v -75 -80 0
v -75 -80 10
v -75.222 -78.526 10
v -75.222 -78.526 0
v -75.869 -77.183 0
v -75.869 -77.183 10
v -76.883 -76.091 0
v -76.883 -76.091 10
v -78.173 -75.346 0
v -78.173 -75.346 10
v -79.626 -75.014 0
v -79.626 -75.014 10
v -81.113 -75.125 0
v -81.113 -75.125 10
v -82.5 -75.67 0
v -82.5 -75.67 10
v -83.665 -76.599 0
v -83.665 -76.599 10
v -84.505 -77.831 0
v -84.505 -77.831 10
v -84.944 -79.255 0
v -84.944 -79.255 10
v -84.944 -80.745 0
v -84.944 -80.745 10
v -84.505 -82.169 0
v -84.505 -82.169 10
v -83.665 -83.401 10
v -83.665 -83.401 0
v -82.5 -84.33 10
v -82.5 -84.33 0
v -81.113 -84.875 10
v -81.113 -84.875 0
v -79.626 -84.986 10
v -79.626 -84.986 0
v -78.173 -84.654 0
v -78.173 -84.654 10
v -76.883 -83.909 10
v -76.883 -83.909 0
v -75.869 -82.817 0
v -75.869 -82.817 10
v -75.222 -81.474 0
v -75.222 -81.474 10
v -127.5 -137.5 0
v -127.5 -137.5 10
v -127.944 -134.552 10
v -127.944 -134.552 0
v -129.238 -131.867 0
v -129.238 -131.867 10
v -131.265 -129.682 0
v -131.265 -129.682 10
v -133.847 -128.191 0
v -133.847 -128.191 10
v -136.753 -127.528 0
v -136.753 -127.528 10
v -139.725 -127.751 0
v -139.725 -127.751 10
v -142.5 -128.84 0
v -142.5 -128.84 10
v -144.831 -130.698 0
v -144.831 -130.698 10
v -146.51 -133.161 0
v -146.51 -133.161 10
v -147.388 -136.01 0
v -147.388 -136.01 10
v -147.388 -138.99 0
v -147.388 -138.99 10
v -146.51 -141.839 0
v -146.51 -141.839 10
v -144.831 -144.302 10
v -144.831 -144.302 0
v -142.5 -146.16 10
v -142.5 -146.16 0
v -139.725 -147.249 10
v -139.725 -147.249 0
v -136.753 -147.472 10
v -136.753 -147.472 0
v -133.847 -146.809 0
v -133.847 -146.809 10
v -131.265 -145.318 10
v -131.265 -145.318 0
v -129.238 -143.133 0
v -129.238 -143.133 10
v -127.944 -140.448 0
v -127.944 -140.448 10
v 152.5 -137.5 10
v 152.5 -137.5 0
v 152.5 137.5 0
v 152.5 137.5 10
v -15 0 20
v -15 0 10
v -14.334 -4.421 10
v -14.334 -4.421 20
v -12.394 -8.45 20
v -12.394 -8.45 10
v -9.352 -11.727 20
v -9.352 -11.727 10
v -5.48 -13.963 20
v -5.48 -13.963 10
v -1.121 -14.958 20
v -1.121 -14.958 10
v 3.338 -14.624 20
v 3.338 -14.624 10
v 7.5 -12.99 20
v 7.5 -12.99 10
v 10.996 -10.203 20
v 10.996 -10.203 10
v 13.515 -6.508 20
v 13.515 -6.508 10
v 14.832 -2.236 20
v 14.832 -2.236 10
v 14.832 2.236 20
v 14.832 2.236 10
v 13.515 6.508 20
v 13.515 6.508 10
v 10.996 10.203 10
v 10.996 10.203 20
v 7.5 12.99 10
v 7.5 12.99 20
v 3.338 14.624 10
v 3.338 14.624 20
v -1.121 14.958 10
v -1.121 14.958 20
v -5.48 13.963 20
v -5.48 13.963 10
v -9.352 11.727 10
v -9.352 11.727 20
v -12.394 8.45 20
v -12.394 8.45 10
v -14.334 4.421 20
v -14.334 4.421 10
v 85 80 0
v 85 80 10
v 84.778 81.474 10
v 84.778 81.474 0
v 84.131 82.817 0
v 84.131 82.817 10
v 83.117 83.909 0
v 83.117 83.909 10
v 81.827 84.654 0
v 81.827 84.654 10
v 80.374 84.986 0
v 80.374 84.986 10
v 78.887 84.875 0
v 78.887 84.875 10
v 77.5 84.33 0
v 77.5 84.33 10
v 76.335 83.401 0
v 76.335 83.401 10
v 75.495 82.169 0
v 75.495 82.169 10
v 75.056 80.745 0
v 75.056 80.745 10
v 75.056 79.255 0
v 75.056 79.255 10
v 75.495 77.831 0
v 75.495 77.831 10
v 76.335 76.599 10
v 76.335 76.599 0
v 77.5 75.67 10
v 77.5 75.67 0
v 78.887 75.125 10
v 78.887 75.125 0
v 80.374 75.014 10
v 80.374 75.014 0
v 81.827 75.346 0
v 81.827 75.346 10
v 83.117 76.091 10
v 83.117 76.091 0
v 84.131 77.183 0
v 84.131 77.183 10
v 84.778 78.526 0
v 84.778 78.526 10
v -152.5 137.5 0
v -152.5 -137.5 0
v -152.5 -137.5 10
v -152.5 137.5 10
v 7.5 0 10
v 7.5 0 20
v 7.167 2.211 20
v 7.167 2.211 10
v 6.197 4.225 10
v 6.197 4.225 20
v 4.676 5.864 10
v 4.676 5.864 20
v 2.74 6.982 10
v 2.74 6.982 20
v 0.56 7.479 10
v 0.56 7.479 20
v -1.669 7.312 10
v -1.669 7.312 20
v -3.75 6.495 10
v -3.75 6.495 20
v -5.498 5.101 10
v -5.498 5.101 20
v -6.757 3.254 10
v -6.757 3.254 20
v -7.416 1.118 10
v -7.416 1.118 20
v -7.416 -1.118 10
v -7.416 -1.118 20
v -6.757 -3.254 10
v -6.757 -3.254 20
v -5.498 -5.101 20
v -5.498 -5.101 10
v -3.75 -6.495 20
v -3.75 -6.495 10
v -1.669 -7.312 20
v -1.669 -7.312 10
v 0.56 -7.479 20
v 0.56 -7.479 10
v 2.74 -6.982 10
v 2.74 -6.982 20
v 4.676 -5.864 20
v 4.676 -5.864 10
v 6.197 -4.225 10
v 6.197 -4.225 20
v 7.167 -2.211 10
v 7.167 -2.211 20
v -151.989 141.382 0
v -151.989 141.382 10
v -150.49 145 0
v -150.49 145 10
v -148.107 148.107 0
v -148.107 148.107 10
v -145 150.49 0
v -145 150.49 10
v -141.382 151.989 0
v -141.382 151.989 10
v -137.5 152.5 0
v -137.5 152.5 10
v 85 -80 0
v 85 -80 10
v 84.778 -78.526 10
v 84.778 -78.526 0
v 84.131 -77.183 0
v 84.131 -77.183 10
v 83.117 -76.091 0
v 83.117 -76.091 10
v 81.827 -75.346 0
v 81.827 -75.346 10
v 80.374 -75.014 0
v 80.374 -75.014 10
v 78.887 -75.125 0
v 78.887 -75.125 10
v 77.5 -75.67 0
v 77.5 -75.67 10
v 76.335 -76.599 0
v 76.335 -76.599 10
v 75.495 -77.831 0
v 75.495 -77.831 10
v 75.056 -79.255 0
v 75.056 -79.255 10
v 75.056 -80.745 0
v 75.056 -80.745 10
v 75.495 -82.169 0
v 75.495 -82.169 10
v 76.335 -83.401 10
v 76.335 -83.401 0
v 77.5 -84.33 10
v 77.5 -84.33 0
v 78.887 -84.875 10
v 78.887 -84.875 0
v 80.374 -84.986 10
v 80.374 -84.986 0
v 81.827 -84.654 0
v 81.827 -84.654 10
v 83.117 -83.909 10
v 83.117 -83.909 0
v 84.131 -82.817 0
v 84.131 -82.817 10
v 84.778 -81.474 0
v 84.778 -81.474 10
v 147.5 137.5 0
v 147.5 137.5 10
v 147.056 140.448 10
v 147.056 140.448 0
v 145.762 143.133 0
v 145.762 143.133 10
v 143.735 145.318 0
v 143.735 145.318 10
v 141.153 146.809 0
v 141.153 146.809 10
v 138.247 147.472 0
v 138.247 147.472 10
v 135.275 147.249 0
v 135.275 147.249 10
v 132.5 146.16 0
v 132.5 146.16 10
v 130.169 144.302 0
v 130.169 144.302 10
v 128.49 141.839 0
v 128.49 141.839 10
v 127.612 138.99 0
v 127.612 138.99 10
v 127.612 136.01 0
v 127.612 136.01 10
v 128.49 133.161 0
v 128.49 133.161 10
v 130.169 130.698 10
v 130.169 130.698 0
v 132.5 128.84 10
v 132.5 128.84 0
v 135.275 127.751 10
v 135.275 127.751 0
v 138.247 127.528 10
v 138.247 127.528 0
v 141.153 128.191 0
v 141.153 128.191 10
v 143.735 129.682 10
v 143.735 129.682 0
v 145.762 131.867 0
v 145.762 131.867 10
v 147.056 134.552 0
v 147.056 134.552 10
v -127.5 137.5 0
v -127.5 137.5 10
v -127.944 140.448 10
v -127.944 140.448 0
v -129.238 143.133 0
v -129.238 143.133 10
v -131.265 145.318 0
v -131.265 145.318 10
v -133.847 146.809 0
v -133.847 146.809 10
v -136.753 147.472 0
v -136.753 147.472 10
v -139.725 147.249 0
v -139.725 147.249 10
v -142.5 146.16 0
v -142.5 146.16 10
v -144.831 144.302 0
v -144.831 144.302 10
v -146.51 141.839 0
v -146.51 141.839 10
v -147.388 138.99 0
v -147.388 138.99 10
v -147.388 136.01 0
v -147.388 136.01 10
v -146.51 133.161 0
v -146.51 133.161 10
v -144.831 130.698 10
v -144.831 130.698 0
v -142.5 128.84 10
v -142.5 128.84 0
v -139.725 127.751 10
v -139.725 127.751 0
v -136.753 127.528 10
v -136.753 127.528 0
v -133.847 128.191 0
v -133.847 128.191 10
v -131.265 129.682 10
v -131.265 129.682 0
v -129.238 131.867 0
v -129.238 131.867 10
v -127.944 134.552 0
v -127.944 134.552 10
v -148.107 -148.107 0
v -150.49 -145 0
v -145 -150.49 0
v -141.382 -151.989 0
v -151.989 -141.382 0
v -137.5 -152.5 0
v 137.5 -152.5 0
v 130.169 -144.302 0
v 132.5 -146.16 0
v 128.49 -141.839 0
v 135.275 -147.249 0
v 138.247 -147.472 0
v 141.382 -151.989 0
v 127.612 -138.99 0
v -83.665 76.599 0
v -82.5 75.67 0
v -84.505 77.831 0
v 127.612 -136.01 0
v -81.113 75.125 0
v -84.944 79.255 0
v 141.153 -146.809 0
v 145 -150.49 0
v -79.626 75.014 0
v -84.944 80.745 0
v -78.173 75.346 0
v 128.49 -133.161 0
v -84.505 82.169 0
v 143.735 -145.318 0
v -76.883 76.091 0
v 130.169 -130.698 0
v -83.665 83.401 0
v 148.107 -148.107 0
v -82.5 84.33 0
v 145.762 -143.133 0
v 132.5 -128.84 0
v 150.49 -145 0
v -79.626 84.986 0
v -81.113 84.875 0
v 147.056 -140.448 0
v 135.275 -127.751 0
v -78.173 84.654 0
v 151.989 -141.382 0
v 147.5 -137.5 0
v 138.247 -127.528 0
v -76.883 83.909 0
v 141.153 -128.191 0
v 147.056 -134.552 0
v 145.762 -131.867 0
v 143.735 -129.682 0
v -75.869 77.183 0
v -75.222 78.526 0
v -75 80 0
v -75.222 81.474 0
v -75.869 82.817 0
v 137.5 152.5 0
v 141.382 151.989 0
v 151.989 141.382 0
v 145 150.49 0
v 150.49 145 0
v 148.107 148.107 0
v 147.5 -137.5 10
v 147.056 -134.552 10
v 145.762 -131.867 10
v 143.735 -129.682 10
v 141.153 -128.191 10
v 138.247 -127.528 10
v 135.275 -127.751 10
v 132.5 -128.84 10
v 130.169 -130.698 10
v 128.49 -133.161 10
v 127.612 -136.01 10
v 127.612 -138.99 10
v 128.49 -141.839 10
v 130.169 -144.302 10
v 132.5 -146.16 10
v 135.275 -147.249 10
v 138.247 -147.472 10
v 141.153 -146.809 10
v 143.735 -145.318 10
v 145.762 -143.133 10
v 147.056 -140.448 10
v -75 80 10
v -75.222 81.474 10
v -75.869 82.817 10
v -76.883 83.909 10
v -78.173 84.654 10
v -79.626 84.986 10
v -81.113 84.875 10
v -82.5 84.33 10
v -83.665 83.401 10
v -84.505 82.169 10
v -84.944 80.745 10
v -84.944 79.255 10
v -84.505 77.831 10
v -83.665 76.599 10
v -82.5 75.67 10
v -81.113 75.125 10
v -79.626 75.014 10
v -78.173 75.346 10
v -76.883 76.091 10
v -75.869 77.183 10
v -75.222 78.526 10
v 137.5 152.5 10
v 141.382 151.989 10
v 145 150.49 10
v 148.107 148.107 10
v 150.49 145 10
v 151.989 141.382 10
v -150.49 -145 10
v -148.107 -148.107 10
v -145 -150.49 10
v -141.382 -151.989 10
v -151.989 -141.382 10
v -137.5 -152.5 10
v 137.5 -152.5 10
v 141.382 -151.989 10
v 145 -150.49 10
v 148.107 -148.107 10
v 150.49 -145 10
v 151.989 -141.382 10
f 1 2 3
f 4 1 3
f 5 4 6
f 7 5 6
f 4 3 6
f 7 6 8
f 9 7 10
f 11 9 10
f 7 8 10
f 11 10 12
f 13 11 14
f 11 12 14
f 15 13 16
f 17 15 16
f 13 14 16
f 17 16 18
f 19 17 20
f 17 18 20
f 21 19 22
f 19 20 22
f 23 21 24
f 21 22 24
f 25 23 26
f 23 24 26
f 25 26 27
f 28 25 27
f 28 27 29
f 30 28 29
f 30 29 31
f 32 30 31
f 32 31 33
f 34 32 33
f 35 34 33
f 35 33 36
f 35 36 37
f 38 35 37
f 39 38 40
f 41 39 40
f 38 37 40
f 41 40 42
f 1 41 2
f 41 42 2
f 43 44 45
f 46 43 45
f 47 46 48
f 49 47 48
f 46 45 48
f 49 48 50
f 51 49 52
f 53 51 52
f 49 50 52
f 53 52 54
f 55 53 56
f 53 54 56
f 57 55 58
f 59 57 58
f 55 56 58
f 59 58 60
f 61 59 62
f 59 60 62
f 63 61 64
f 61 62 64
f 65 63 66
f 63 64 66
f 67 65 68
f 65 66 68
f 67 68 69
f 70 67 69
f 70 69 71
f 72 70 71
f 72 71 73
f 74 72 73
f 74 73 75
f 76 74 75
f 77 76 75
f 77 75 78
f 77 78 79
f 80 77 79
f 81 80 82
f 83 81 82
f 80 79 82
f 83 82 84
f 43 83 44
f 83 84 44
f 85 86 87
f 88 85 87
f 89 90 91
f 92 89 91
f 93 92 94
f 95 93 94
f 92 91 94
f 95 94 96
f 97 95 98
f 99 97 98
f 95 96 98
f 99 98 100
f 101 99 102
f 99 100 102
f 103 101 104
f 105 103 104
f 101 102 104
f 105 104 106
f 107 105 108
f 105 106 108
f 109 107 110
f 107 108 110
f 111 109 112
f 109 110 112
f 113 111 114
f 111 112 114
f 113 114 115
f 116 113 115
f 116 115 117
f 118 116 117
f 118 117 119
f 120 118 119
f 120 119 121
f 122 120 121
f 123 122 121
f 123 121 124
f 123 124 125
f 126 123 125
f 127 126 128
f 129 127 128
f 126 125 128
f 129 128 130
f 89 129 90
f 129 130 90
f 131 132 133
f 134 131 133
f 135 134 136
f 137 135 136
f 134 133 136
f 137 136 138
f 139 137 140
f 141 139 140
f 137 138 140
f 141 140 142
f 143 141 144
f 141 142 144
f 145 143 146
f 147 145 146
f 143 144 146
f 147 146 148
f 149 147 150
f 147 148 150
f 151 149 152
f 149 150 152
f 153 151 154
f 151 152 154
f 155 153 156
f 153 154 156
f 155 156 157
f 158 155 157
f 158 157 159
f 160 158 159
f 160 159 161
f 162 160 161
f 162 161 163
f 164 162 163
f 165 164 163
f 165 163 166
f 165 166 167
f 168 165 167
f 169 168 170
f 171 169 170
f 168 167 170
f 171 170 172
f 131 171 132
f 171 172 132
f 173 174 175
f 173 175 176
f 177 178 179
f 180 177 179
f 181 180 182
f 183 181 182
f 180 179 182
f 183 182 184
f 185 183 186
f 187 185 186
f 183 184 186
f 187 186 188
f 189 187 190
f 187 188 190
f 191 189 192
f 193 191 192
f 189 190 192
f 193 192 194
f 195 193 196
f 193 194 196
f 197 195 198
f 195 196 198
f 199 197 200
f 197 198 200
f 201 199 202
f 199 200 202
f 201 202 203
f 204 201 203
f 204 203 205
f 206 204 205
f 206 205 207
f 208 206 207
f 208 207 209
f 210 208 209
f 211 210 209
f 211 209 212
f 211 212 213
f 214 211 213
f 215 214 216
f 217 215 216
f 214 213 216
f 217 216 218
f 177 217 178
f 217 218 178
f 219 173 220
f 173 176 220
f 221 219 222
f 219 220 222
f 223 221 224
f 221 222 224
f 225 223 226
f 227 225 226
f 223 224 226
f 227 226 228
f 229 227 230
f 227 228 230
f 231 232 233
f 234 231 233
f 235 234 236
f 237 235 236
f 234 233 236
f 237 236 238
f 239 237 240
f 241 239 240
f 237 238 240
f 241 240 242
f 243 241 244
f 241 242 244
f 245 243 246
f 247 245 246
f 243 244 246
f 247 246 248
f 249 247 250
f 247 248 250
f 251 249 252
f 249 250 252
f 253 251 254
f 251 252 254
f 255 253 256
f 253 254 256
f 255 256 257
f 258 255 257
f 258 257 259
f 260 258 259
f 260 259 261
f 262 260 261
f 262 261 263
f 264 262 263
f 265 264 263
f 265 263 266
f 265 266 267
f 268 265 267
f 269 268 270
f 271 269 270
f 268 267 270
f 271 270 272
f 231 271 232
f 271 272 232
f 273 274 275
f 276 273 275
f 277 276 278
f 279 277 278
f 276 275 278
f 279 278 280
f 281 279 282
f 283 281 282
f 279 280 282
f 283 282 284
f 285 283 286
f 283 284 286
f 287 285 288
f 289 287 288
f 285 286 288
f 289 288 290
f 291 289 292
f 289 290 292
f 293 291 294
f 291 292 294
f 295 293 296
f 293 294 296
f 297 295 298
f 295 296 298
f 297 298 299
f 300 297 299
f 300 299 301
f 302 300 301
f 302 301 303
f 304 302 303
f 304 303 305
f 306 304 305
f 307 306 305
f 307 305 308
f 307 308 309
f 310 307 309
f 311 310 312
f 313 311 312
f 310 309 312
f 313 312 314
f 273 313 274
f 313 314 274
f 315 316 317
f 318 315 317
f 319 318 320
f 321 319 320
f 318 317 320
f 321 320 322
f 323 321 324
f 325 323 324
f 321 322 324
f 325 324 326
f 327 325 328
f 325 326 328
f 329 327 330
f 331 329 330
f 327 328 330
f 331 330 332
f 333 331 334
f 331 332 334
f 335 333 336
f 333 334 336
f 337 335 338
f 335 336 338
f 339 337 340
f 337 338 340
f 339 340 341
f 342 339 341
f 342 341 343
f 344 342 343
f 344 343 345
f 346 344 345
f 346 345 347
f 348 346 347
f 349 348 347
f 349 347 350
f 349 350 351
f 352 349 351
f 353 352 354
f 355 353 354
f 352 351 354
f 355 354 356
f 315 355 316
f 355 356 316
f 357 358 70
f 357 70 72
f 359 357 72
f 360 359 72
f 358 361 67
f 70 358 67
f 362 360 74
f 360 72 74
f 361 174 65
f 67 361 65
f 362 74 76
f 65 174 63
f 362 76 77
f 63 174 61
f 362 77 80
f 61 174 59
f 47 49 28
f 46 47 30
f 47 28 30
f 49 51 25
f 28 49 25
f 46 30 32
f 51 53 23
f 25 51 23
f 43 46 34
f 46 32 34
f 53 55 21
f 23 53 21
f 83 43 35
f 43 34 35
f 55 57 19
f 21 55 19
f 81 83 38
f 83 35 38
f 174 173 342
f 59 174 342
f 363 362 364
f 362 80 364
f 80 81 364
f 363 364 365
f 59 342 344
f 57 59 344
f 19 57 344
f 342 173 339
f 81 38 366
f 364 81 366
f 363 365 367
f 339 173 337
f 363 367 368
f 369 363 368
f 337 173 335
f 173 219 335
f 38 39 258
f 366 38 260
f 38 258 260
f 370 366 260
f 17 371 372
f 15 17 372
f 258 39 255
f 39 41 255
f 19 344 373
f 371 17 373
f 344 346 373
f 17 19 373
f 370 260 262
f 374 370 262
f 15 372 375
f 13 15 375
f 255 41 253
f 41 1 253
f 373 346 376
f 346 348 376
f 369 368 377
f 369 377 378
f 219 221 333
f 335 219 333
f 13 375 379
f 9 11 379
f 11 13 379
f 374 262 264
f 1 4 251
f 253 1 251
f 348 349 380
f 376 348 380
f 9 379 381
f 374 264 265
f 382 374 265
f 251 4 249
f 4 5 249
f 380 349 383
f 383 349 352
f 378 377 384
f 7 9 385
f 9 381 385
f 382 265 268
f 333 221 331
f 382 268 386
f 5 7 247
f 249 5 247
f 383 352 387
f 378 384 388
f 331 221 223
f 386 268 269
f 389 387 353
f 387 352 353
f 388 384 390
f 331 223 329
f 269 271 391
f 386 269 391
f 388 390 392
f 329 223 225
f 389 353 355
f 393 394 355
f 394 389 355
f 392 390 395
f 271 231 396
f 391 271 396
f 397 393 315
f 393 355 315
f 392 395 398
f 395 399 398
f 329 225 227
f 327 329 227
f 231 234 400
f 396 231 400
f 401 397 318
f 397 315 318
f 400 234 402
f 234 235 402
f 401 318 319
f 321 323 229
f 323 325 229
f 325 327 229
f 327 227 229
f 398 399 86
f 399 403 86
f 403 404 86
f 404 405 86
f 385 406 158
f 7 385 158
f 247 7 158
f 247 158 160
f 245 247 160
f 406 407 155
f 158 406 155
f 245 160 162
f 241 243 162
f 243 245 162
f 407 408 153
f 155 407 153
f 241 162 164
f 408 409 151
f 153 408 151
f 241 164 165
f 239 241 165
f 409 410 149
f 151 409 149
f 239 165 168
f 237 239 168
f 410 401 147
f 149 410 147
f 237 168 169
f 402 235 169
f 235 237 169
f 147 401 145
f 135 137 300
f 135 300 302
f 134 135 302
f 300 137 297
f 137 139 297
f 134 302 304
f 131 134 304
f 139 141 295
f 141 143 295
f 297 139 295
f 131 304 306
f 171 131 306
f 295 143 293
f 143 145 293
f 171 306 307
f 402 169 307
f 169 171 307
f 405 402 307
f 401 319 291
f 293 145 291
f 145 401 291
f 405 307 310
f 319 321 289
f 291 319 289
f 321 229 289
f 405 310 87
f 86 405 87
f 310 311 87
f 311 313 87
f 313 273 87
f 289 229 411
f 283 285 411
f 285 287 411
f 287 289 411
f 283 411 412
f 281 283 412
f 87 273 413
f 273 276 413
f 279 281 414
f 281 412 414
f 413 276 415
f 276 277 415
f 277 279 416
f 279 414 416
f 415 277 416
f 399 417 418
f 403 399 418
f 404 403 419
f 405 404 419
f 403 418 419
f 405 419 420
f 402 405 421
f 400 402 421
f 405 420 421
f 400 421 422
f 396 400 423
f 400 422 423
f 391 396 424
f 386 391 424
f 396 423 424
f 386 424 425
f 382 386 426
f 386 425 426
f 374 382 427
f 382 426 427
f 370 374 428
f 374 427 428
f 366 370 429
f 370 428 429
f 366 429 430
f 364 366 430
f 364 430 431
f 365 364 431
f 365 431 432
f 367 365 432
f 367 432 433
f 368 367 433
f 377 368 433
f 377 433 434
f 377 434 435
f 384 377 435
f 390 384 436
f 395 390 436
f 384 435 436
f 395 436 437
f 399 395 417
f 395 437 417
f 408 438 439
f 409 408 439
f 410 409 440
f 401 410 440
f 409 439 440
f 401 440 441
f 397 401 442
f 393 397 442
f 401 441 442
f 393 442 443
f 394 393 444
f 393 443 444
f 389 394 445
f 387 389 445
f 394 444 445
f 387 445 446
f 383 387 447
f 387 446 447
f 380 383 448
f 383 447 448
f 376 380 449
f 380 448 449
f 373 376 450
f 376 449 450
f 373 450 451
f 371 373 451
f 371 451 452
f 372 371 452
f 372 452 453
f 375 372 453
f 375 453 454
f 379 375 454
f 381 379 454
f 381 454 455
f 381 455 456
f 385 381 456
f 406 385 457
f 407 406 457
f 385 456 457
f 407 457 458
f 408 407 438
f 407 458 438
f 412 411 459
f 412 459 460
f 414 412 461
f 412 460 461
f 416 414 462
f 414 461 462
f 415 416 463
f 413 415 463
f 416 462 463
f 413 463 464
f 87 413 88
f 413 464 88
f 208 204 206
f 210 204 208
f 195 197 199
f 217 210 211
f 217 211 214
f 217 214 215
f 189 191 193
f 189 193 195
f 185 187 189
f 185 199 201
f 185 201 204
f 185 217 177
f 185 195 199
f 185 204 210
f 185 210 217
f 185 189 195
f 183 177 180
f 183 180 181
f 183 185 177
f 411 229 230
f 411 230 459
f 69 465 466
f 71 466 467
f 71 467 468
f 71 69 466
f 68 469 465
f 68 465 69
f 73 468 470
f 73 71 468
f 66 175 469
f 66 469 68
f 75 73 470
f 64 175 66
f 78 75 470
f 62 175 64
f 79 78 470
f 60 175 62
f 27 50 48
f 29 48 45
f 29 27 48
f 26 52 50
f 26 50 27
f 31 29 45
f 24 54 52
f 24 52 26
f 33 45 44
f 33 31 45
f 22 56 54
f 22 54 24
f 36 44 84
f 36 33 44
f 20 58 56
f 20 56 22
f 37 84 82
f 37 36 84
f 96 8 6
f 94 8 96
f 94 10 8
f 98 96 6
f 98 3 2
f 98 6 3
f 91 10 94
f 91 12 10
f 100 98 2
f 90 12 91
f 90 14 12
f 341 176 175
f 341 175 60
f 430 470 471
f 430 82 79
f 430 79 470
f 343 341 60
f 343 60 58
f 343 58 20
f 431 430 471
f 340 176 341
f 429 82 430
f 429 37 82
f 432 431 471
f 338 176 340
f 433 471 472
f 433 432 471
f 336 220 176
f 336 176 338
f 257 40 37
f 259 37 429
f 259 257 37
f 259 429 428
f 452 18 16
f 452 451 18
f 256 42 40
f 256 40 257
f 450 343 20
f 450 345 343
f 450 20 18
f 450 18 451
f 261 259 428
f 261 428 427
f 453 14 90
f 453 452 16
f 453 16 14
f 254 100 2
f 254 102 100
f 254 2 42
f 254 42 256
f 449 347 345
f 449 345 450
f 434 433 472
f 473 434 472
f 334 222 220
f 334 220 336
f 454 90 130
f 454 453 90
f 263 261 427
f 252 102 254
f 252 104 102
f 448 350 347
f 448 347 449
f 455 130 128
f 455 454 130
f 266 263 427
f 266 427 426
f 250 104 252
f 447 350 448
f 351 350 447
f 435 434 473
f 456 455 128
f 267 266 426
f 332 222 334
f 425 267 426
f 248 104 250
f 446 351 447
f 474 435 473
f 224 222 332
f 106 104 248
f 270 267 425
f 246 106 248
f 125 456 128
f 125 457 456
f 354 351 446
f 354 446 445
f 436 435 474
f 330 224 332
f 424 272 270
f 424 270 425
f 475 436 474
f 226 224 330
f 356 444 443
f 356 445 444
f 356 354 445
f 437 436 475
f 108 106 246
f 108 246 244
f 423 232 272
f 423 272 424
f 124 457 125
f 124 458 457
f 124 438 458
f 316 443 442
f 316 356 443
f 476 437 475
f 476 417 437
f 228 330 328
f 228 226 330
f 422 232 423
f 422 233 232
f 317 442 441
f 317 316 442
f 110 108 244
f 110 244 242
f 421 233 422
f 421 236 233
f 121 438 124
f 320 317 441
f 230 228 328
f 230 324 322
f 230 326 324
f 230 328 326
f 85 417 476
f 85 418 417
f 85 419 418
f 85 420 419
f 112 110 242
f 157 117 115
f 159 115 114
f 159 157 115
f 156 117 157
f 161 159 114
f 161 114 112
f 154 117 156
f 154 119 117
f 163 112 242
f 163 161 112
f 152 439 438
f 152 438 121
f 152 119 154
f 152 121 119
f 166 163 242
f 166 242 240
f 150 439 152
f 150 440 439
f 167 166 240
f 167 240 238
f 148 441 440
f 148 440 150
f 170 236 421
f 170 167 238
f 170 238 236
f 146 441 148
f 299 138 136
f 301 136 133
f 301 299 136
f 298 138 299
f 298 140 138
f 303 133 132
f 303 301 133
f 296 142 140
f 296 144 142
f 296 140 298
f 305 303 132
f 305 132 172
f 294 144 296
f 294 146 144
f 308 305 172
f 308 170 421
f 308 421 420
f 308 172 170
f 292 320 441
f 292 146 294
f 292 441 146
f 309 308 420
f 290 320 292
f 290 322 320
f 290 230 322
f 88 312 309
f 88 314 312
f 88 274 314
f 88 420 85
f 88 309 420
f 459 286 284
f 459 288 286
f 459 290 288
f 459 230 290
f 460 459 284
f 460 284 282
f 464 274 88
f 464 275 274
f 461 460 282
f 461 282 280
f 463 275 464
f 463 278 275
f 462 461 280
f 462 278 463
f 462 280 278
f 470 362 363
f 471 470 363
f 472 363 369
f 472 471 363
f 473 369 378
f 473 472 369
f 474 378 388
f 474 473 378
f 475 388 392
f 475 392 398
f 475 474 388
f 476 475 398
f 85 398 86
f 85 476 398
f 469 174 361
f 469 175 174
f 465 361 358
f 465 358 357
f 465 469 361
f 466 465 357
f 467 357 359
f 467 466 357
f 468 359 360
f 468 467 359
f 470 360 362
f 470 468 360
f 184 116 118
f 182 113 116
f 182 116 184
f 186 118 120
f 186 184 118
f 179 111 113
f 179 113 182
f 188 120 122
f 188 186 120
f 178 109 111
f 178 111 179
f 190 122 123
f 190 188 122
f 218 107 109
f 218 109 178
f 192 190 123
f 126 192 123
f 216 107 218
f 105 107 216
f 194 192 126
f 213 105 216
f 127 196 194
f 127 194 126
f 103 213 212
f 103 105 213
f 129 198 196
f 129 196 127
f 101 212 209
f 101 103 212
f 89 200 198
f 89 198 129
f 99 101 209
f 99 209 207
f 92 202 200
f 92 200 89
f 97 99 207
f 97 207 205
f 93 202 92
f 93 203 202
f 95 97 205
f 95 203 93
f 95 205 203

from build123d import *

# Parameters (mm, degrees)
ESQUISSE1_W              = 305
ESQUISSE1_H              = 305
BOSS_EXTRU_1_DEPTH       = 10
ESQUISSE2_R              = 10
ENL_V_MAT_EXTRU_10_DEPTH = 10
CONG_2_R                 = 15
ESQUISSE3_R              = 5
ENL_V_MAT_EXTRU_11_DEPTH = 10
ESQUISSE4_R              = 15
BOSS_EXTRU_2_DEPTH       = 10
ESQUISSE5_R              = 7.5
ENL_V_MAT_EXTRU_12_DEPTH = 10


with BuildPart() as part:
    # Esquisse1 → Boss.-Extru.1 (new body)
    with BuildSketch(Plane.XY):
        Rectangle(ESQUISSE1_W, ESQUISSE1_H)
    extrude(amount=BOSS_EXTRU_1_DEPTH)

    # Esquisse2 → Enlèv. mat.-Extru.10 (cut)
    with BuildSketch(Plane.XY.offset(10)):
        with Locations((137.5, 137.5)):
            Circle(ESQUISSE2_R)
        with Locations((137.5, -137.5)):
            Circle(ESQUISSE2_R)
        with Locations((-137.5, -137.5)):
            Circle(ESQUISSE2_R)
        with Locations((-137.5, 137.5)):
            Circle(ESQUISSE2_R)
    extrude(amount=-ENL_V_MAT_EXTRU_10_DEPTH, mode=Mode.SUBTRACT)

    # Congé2
    cong_2_edges = [part.edges().sort_by_distance(p)[0] for p in [
        (-152.5, 152.5, 5),
        (152.5, 152.5, 5),
        (152.5, -152.5, 5),
        (-152.5, -152.5, 5),
    ]]
    fillet(cong_2_edges, radius=CONG_2_R)

    # Esquisse3 → Enlèv. mat.-Extru.11 (cut)
    with BuildSketch(Plane.XY.offset(10)):
        with Locations((80, 80)):
            Circle(ESQUISSE3_R)
        with Locations((80, -80)):
            Circle(ESQUISSE3_R)
        with Locations((-80, -80)):
            Circle(ESQUISSE3_R)
        with Locations((-80, 80)):
            Circle(ESQUISSE3_R)
    extrude(amount=-ENL_V_MAT_EXTRU_11_DEPTH, mode=Mode.SUBTRACT)

    # Esquisse4 → Boss.-Extru.2 (add)
    with BuildSketch(Plane.XY.offset(10)):
        with Locations(Location((0, 0, 0), (0, 0, 180))):
            Circle(ESQUISSE4_R)
    extrude(amount=BOSS_EXTRU_2_DEPTH)

    # Esquisse5 → Enlèv. mat.-Extru.12 (cut)
    with BuildSketch(Plane.XY.offset(20)):
        Circle(ESQUISSE5_R)
    extrude(amount=-ENL_V_MAT_EXTRU_12_DEPTH, mode=Mode.SUBTRACT)


solid = part.part
